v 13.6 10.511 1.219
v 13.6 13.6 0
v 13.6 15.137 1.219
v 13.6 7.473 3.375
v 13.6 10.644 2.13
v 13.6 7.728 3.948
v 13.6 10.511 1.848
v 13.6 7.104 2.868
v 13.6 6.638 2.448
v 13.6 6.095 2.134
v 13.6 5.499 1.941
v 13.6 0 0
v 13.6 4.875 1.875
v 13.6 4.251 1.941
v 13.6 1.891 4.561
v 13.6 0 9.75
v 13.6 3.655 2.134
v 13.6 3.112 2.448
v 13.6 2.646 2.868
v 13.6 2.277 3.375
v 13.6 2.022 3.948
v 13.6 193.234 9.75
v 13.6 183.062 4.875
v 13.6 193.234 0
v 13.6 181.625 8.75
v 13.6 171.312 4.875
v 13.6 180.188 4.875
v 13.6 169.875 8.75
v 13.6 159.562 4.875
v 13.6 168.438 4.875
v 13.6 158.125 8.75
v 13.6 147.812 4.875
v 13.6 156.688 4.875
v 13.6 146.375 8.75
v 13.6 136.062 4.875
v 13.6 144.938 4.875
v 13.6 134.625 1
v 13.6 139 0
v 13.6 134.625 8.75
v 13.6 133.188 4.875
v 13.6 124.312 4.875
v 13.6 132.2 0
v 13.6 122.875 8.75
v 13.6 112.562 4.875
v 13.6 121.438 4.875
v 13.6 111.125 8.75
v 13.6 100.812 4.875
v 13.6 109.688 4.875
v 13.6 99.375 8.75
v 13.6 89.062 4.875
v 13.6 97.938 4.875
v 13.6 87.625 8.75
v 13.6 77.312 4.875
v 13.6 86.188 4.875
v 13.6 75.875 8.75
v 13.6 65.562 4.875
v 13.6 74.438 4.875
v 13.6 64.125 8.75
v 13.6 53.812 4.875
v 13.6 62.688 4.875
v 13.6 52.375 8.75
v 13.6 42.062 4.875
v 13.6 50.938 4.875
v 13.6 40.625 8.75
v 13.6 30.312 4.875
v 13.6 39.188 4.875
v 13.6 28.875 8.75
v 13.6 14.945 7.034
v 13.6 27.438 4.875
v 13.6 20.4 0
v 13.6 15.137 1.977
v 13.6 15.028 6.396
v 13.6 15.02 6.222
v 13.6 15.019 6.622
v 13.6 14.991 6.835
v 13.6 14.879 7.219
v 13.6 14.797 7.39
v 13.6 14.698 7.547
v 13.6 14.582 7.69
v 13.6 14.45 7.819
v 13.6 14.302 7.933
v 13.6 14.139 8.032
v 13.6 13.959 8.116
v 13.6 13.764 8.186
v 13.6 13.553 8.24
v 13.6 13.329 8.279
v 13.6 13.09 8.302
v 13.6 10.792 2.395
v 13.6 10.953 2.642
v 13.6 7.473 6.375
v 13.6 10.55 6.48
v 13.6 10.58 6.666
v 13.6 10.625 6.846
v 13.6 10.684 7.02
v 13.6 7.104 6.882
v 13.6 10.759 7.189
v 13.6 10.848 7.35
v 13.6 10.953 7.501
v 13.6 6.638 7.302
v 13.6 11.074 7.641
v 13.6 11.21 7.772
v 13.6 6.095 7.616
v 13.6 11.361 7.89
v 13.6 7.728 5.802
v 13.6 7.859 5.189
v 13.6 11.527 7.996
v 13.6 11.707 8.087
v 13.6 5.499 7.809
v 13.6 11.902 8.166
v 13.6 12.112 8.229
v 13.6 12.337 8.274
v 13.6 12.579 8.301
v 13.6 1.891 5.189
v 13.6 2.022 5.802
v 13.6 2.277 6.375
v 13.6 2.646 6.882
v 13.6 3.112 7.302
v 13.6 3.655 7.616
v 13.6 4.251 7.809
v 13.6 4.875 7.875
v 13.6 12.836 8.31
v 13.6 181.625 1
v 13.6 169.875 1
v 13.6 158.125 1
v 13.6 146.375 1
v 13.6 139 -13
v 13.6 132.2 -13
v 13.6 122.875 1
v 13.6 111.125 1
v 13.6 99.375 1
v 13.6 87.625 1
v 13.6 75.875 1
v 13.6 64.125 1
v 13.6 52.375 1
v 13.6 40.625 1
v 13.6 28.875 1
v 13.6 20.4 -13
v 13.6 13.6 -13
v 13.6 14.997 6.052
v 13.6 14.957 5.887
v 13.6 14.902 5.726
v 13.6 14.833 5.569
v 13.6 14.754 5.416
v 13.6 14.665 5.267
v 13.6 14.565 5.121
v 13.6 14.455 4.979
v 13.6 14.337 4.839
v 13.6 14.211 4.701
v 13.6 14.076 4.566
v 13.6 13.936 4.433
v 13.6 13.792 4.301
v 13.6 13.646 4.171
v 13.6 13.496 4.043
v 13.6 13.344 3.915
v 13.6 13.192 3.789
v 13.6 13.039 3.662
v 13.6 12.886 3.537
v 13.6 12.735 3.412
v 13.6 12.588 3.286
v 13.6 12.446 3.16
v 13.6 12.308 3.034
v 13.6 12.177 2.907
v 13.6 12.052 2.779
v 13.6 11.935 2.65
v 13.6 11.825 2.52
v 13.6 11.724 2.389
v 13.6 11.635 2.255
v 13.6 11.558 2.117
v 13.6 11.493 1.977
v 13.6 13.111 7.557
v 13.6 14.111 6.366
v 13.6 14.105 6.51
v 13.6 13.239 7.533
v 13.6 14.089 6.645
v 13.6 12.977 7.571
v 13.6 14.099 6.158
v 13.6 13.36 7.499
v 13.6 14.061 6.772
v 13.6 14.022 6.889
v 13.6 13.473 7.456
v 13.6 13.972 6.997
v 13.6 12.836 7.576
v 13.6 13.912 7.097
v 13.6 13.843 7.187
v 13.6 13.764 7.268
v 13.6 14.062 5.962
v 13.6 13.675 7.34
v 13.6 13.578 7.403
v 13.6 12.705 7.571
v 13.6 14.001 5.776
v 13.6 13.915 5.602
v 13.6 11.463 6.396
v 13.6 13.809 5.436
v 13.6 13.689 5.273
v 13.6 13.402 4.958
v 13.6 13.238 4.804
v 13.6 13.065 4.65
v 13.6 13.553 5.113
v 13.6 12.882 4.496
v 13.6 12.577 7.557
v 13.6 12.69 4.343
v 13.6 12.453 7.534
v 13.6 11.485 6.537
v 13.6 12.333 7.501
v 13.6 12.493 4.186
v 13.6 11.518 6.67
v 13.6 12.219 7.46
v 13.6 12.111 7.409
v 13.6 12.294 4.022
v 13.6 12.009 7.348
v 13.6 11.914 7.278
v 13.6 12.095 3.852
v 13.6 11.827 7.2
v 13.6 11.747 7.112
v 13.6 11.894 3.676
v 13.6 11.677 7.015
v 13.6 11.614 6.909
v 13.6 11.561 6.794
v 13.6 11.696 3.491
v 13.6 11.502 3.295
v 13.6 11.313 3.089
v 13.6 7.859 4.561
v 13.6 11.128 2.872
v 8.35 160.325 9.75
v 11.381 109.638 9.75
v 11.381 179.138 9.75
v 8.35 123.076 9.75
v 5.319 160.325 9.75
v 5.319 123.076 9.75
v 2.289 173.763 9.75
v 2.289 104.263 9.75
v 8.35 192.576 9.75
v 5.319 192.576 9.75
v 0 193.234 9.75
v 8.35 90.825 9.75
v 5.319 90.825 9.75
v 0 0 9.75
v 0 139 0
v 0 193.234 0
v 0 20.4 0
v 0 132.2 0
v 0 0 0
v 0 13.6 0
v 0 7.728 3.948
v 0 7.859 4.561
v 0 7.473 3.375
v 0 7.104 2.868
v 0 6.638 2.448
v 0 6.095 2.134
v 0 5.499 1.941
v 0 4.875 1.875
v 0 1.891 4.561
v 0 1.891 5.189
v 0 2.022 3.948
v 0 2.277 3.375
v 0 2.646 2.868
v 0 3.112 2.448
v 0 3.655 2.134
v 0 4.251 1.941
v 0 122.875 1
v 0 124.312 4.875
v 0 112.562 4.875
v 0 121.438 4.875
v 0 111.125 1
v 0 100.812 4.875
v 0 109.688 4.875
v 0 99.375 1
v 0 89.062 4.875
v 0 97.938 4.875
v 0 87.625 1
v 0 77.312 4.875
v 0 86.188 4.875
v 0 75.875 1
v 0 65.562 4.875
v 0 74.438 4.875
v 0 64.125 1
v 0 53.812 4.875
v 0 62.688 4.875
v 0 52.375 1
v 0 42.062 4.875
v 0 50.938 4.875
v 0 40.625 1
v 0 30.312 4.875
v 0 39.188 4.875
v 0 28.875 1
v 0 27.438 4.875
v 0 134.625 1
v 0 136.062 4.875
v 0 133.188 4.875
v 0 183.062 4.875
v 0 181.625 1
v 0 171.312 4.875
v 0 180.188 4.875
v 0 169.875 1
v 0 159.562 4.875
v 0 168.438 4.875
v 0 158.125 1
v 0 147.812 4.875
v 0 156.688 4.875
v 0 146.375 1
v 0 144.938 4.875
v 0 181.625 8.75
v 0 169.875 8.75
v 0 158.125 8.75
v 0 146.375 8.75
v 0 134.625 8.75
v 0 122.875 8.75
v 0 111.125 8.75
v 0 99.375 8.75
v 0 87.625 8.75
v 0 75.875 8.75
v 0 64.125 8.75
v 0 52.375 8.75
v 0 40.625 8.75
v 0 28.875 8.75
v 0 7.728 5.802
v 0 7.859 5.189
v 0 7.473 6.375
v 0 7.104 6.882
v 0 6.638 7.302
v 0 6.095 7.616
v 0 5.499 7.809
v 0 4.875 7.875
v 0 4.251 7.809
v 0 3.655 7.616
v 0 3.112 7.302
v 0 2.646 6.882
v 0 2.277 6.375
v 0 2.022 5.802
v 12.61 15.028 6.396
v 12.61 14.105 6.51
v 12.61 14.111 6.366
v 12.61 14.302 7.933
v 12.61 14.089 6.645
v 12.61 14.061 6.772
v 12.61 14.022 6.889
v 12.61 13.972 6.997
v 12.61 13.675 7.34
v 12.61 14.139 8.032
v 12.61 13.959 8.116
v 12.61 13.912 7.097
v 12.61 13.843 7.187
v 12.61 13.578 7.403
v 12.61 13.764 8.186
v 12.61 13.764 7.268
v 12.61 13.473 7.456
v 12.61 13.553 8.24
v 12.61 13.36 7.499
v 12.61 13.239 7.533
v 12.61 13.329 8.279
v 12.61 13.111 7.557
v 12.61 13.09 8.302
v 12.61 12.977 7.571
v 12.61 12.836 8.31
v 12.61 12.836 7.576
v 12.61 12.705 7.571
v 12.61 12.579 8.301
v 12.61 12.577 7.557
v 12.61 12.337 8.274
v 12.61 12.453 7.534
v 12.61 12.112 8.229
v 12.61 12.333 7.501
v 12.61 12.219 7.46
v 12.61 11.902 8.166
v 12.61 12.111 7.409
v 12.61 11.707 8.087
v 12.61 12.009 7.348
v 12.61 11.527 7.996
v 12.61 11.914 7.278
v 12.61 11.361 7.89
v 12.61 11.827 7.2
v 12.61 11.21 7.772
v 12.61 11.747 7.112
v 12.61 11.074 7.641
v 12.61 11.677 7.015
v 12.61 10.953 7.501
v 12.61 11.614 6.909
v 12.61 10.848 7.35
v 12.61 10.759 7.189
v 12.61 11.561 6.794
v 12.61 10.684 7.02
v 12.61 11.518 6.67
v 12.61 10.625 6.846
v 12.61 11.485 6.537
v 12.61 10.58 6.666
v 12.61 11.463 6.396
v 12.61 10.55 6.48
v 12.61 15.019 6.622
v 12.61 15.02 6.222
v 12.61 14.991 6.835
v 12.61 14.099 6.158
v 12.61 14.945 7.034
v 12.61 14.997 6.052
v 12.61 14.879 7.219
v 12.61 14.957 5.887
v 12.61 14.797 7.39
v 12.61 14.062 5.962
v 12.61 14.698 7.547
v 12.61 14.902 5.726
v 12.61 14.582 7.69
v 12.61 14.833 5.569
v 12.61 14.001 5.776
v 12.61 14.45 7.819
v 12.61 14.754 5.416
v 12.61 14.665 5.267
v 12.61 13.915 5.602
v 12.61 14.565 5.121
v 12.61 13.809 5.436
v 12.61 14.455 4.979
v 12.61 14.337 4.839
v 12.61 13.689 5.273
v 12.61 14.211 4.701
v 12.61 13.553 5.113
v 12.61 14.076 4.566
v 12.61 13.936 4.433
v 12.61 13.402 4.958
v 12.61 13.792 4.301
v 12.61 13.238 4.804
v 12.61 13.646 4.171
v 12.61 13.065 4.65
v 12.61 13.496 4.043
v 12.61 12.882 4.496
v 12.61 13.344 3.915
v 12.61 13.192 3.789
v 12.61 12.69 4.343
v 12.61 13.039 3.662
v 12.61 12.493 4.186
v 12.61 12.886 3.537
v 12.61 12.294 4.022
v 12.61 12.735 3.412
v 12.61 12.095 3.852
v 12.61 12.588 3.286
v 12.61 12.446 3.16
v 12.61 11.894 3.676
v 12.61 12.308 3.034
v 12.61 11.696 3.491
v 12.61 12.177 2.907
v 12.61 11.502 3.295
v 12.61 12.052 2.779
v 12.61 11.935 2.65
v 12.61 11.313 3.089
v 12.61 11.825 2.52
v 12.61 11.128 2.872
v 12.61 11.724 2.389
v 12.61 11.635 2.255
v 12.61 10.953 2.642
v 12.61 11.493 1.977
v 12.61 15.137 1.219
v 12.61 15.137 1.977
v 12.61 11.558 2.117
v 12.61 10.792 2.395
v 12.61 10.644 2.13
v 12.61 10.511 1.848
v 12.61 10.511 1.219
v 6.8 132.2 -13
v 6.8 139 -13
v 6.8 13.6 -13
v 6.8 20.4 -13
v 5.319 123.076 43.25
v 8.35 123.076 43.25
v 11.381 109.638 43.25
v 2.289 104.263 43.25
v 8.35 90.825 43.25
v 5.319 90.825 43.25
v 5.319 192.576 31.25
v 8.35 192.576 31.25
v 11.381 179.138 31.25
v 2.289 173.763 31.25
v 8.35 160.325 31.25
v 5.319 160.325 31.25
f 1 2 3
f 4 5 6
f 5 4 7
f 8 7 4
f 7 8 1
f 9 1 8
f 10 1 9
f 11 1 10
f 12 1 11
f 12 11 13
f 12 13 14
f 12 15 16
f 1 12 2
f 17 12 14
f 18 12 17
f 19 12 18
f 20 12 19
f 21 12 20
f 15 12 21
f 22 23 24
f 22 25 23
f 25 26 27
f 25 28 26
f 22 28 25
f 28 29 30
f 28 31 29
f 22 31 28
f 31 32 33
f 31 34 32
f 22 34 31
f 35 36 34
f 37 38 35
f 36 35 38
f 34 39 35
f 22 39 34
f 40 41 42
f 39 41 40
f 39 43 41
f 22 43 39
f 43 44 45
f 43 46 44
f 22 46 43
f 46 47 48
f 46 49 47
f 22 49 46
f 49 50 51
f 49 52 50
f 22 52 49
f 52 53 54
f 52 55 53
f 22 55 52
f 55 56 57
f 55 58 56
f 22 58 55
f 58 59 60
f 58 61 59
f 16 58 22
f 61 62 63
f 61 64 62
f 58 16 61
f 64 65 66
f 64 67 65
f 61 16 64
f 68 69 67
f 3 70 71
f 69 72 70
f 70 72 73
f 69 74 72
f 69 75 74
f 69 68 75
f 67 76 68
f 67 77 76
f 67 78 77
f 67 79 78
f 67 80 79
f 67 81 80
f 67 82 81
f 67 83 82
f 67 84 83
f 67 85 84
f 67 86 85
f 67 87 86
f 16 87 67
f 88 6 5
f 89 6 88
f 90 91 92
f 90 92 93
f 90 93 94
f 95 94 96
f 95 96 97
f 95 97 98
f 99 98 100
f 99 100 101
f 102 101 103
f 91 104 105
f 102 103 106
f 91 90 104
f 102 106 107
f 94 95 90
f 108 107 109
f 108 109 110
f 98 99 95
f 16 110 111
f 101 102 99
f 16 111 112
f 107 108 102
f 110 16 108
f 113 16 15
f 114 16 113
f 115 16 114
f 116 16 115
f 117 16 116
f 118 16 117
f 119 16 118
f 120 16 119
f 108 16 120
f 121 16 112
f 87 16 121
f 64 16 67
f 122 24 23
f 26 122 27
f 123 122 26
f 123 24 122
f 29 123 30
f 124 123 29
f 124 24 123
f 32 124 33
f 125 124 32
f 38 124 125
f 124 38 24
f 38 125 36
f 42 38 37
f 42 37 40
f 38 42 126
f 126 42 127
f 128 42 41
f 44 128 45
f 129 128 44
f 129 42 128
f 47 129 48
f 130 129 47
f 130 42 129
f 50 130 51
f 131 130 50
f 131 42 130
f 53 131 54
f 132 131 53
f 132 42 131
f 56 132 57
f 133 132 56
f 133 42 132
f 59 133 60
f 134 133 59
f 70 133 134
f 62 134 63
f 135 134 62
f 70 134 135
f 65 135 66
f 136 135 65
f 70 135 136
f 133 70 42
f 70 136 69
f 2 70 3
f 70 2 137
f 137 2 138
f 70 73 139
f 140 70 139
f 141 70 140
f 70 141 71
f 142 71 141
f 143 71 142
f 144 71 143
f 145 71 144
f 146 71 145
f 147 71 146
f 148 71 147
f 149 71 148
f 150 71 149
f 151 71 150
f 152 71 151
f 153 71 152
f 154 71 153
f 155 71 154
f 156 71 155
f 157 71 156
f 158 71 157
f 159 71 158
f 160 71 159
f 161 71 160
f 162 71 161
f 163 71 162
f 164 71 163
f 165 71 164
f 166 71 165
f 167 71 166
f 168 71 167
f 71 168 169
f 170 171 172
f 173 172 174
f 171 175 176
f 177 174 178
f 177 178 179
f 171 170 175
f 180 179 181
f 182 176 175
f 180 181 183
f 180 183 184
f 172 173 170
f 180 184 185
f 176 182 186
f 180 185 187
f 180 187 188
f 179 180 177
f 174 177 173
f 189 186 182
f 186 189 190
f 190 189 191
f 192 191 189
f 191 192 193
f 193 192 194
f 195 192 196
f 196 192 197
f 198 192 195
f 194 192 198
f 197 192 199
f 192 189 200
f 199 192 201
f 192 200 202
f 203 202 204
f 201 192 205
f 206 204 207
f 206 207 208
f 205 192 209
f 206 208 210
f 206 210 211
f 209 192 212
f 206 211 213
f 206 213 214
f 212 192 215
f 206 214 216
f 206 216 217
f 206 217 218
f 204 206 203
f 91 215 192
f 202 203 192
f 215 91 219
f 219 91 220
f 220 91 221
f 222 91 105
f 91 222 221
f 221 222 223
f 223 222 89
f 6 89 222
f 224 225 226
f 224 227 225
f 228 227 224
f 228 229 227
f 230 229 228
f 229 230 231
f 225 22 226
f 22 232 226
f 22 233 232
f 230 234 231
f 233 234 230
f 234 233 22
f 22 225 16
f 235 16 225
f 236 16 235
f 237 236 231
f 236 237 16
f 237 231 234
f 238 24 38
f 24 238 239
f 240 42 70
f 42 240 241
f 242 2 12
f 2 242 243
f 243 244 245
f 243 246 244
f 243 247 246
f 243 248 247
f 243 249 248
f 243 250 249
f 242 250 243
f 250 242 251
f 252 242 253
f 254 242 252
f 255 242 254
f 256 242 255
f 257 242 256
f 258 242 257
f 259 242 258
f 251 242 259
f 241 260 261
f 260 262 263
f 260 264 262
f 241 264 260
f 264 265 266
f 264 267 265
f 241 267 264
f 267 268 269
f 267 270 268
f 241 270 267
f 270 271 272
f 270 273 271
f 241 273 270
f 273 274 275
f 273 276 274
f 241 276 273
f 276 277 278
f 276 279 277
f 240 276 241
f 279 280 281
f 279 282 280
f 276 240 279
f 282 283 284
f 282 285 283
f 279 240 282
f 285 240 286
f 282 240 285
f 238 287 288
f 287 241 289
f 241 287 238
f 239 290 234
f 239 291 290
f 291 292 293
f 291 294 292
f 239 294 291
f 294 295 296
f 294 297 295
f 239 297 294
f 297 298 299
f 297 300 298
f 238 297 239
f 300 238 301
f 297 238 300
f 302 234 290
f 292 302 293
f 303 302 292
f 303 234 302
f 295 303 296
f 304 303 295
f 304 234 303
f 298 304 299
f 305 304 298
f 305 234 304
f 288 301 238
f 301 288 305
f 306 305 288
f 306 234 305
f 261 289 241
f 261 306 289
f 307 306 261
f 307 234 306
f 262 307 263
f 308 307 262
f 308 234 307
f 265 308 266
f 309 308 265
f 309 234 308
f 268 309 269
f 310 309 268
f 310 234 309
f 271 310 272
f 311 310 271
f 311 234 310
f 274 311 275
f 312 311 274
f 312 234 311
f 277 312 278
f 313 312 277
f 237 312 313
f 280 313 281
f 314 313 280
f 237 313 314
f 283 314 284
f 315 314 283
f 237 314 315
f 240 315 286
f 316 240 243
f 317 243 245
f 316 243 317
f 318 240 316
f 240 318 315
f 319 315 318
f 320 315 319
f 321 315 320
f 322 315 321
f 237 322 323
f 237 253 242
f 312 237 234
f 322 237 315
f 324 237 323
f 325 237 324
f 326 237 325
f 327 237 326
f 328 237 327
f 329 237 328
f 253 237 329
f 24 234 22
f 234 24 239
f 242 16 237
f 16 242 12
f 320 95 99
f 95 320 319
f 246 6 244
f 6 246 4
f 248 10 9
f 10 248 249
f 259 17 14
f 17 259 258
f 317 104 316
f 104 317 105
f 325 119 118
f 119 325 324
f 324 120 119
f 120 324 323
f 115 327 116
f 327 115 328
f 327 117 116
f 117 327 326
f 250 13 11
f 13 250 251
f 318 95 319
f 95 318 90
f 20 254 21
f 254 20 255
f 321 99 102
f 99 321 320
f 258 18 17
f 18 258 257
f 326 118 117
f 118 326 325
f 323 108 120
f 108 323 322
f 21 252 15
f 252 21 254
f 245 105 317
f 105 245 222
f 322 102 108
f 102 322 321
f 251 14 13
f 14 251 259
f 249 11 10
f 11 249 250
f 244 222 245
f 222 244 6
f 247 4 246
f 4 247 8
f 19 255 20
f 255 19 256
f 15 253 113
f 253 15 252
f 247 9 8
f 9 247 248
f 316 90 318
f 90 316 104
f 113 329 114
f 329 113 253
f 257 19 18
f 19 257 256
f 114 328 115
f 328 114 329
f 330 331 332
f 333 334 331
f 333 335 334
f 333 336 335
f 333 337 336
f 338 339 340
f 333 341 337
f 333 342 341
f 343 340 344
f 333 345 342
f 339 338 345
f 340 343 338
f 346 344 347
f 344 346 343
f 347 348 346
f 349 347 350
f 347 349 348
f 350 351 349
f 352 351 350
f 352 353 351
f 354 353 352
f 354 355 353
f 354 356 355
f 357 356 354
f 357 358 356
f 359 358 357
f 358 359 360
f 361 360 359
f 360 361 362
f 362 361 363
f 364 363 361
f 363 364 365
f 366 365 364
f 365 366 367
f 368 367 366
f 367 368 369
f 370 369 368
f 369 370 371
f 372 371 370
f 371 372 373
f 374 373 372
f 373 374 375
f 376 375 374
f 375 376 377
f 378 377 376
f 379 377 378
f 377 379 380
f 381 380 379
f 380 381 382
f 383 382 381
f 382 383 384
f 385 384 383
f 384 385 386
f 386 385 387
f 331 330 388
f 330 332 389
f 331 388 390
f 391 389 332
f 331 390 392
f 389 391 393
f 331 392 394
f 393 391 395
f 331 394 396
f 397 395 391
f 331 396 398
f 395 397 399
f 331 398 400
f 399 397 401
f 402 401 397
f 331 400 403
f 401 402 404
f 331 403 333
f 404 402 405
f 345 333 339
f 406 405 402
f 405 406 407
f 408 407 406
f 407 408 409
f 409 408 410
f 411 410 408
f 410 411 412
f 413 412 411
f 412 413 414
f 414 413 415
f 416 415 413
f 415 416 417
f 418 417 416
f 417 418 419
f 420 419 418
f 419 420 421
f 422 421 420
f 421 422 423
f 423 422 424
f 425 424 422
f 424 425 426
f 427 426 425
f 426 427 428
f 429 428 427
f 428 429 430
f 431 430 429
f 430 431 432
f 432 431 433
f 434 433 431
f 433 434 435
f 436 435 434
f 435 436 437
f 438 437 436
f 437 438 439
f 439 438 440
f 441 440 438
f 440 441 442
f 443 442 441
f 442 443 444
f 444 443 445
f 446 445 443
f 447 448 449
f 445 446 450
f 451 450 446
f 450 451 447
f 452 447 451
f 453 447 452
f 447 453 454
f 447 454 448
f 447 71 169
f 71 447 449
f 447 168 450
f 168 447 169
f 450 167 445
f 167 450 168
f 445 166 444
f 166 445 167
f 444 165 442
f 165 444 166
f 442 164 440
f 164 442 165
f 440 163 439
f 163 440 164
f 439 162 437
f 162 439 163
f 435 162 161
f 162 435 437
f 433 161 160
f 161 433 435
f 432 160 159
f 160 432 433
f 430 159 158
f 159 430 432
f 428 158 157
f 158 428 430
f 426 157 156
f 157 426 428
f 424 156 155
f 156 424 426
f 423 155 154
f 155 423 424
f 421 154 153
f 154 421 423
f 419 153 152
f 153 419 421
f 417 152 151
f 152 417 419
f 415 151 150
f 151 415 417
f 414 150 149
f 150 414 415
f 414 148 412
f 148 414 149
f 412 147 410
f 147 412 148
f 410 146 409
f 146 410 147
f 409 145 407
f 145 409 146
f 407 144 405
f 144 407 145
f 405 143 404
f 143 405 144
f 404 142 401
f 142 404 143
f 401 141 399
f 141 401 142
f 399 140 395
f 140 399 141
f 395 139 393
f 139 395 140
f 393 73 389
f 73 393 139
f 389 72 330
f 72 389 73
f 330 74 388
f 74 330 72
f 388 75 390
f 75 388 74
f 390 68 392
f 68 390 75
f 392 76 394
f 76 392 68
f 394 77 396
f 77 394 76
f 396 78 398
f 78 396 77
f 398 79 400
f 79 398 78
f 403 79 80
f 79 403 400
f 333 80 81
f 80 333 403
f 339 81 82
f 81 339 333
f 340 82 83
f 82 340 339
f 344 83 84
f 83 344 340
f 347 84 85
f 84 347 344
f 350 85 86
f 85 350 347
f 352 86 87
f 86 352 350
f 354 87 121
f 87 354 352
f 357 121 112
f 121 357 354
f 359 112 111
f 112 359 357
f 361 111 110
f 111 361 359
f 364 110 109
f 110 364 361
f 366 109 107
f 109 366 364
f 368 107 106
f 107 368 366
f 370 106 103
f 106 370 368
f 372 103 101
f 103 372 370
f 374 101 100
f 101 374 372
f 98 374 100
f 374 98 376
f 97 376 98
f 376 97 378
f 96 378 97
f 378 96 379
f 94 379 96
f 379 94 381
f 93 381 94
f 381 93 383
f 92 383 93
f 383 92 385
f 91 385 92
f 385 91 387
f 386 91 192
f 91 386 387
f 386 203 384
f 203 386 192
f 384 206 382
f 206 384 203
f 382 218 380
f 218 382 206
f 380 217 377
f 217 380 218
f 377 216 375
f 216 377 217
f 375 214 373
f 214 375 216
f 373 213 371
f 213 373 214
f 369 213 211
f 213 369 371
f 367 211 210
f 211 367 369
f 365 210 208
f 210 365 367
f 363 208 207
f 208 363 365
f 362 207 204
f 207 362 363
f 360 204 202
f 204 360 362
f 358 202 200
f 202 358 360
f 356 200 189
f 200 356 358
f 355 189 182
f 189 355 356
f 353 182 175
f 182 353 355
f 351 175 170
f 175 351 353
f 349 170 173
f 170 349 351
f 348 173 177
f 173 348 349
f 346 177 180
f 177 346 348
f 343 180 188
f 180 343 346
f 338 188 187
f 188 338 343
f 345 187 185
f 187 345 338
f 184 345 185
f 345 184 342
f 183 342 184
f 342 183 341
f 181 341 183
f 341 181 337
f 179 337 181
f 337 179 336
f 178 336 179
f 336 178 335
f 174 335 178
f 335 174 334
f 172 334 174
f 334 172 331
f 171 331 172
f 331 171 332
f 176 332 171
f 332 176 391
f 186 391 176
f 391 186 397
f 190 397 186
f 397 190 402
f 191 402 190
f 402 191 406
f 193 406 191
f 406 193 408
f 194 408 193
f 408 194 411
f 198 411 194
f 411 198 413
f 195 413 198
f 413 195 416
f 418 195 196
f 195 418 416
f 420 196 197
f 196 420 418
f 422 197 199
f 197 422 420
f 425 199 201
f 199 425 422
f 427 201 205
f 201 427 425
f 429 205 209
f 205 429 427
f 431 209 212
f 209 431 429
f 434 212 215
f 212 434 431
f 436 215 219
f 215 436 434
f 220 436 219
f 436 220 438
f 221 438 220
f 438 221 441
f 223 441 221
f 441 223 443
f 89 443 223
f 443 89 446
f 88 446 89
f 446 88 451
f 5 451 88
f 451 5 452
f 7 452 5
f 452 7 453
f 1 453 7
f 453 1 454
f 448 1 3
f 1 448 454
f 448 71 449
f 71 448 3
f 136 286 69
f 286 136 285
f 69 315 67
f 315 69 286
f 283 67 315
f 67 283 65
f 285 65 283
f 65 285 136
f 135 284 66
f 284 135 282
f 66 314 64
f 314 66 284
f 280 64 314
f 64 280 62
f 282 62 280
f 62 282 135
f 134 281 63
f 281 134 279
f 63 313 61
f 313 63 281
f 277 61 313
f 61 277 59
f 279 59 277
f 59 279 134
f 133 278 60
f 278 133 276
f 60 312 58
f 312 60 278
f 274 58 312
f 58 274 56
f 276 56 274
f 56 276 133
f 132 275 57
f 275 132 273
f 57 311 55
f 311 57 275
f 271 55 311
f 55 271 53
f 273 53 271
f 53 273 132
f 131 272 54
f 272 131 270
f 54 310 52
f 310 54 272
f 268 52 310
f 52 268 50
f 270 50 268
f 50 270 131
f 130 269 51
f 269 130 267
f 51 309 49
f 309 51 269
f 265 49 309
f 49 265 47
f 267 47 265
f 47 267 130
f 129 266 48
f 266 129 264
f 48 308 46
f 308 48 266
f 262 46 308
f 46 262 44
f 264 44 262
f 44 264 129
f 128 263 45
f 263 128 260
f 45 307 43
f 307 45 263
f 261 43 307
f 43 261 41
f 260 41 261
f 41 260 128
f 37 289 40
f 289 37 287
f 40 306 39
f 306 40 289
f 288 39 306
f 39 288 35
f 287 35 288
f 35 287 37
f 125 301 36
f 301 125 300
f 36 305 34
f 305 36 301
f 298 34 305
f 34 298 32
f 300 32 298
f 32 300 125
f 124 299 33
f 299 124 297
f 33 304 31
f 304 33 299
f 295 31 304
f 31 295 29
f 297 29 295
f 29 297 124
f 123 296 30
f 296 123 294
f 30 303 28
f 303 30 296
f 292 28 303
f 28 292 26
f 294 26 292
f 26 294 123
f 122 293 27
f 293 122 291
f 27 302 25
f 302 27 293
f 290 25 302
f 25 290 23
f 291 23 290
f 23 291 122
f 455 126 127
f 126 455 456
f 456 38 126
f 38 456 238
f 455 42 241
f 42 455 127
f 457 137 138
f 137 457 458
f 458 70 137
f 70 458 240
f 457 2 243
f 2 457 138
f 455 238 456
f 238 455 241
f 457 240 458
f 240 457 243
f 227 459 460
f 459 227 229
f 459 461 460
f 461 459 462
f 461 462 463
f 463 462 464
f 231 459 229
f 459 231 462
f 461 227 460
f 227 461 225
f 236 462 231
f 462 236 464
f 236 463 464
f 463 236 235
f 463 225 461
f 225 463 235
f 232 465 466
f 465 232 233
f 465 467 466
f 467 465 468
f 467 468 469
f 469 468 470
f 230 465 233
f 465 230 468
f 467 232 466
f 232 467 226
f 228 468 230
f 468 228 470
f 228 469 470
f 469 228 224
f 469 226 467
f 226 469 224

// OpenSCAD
// file: values.scad
$fs=0.1;
//Constants:
edgeRadius=1.5;
underKeyWidth=13.6;
baseHeight=9.75;
genh=5.791666666666667;
a=27.423996629776394;
b=12.370392724366756;
c=12.370392724366756;
d=38.393595281686956;
overhead=65.81759191146335;
keyTravelDistance=13.0;
desiredGamut=24;
shift=3.092598181091689;
holeScale=0.5;
stalkScale=0.48;

Points = [
[shift,a,0],//0
[(b-shift),0,0],//1
[(b+shift),0,0],//2
[(b+c-shift),d,0],//3
[(c+shift),(a+d),0],//4
[(c-shift),(a+d),0],//5
[shift,a,keyTravelDistance],//6
[(b-shift),0,keyTravelDistance],//7
[(b+shift),0,keyTravelDistance],//8
[(b+c-shift),d,keyTravelDistance],//9
[(c+shift),(a+d),keyTravelDistance],//10
[(c-shift),(a+d),keyTravelDistance],//11
];
Faces = [
[0,1,2,3,4,5],
[1,0,6,7],
[2,1,7,8],
[3,2,8,9],
[4,3,9,10],
[5,4,10,11],
[0,5,11,6],
[11,10,9,8,7,6] 
];
// file: keytop.scad
include<values.scad>;
keytop();

module keytopShape(){
polyhedron(Points,Faces);
}
module keytop(){
difference(){
keytopShape();
translate([(b+c)/4,(d+a)/4,-0.1])
scale(holeScale,holeScale,holeScale)
keytopShape();
edge(6,11,1,-1);
edge(6,7,1,1);
edge(7,8,1,1);
edge(8,9,1,1);
edge(9,10,1,-1,-1);
edge(10,11,1,-1);
}
module edge (point1,point2,d1,d2,d3=1){
difference(){
translate([Points[point1][0],Points[point1][1],Points[point1][2]])
rotate([0,90,atan((Points[point2][1]-Points[point1][1])/(Points[point2][0]-Points[point1][0]))])
translate([0,0,d3*30])
rotate(45,0,0)
cube([pow(2*(edgeRadius*edgeRadius),1/2),pow(2*(edgeRadius*edgeRadius),1/2),90],true);
translate([Points[point1][0],Points[point1][1],Points[point1][2]])
rotate([0,90,atan((Points[point2][1]-Points[point1][1])/(Points[point2][0]-Points[point1][0]))])
translate([d1*edgeRadius,d2*edgeRadius,d3*30])
cylinder(90,edgeRadius,edgeRadius, true);
}
}

}
// main file
use<keytop.scad>
include<values.scad>
rotate([0,90,0])2_10();
module 2_10(keytops=false){
length=193.23425857813004;
rotate([0,-90,0]){
//Main Base:
difference(){
cube([underKeyWidth,length,baseHeight],false);
translate([-.1,0.5*baseHeight,0.5*baseHeight])rotate([0,90,0])
cylinder((underKeyWidth+.2),r=3, false);
translate([underKeyWidth-.99,10,0.125*baseHeight])
rotate([90,0,90])
linear_extrude(height=1){
text("2",size=baseHeight*0.75);
}

//Warp Cuts:
translate([-1,0.0+25+0.25*baseHeight,baseHeight-1])
rotate([0,90,0])
linear_extrude(height=underKeyWidth+2)
polygon(points=[[0.5*baseHeight-1,0],[baseHeight-2,0.25*baseHeight-1],[0.5*baseHeight-1,0.5*baseHeight-2],[0,0.25*baseHeight-1]]);
translate([-1,11.75+25+0.25*baseHeight,baseHeight-1])
rotate([0,90,0])
linear_extrude(height=underKeyWidth+2)
polygon(points=[[0.5*baseHeight-1,0],[baseHeight-2,0.25*baseHeight-1],[0.5*baseHeight-1,0.5*baseHeight-2],[0,0.25*baseHeight-1]]);
translate([-1,23.5+25+0.25*baseHeight,baseHeight-1])
rotate([0,90,0])
linear_extrude(height=underKeyWidth+2)
polygon(points=[[0.5*baseHeight-1,0],[baseHeight-2,0.25*baseHeight-1],[0.5*baseHeight-1,0.5*baseHeight-2],[0,0.25*baseHeight-1]]);
translate([-1,35.25+25+0.25*baseHeight,baseHeight-1])
rotate([0,90,0])
linear_extrude(height=underKeyWidth+2)
polygon(points=[[0.5*baseHeight-1,0],[baseHeight-2,0.25*baseHeight-1],[0.5*baseHeight-1,0.5*baseHeight-2],[0,0.25*baseHeight-1]]);
translate([-1,47.0+25+0.25*baseHeight,baseHeight-1])
rotate([0,90,0])
linear_extrude(height=underKeyWidth+2)
polygon(points=[[0.5*baseHeight-1,0],[baseHeight-2,0.25*baseHeight-1],[0.5*baseHeight-1,0.5*baseHeight-2],[0,0.25*baseHeight-1]]);
translate([-1,58.75+25+0.25*baseHeight,baseHeight-1])
rotate([0,90,0])
linear_extrude(height=underKeyWidth+2)
polygon(points=[[0.5*baseHeight-1,0],[baseHeight-2,0.25*baseHeight-1],[0.5*baseHeight-1,0.5*baseHeight-2],[0,0.25*baseHeight-1]]);
translate([-1,70.5+25+0.25*baseHeight,baseHeight-1])
rotate([0,90,0])
linear_extrude(height=underKeyWidth+2)
polygon(points=[[0.5*baseHeight-1,0],[baseHeight-2,0.25*baseHeight-1],[0.5*baseHeight-1,0.5*baseHeight-2],[0,0.25*baseHeight-1]]);
translate([-1,82.25+25+0.25*baseHeight,baseHeight-1])
rotate([0,90,0])
linear_extrude(height=underKeyWidth+2)
polygon(points=[[0.5*baseHeight-1,0],[baseHeight-2,0.25*baseHeight-1],[0.5*baseHeight-1,0.5*baseHeight-2],[0,0.25*baseHeight-1]]);
translate([-1,94.0+25+0.25*baseHeight,baseHeight-1])
rotate([0,90,0])
linear_extrude(height=underKeyWidth+2)
polygon(points=[[0.5*baseHeight-1,0],[baseHeight-2,0.25*baseHeight-1],[0.5*baseHeight-1,0.5*baseHeight-2],[0,0.25*baseHeight-1]]);
translate([-1,105.75+25+0.25*baseHeight,baseHeight-1])
rotate([0,90,0])
linear_extrude(height=underKeyWidth+2)
polygon(points=[[0.5*baseHeight-1,0],[baseHeight-2,0.25*baseHeight-1],[0.5*baseHeight-1,0.5*baseHeight-2],[0,0.25*baseHeight-1]]);
translate([-1,117.5+25+0.25*baseHeight,baseHeight-1])
rotate([0,90,0])
linear_extrude(height=underKeyWidth+2)
polygon(points=[[0.5*baseHeight-1,0],[baseHeight-2,0.25*baseHeight-1],[0.5*baseHeight-1,0.5*baseHeight-2],[0,0.25*baseHeight-1]]);
translate([-1,129.25+25+0.25*baseHeight,baseHeight-1])
rotate([0,90,0])
linear_extrude(height=underKeyWidth+2)
polygon(points=[[0.5*baseHeight-1,0],[baseHeight-2,0.25*baseHeight-1],[0.5*baseHeight-1,0.5*baseHeight-2],[0,0.25*baseHeight-1]]);
translate([-1,141.0+25+0.25*baseHeight,baseHeight-1])
rotate([0,90,0])
linear_extrude(height=underKeyWidth+2)
polygon(points=[[0.5*baseHeight-1,0],[baseHeight-2,0.25*baseHeight-1],[0.5*baseHeight-1,0.5*baseHeight-2],[0,0.25*baseHeight-1]]);
translate([-1,152.75+25+0.25*baseHeight,baseHeight-1])
rotate([0,90,0])
linear_extrude(height=underKeyWidth+2)
polygon(points=[[0.5*baseHeight-1,0],[baseHeight-2,0.25*baseHeight-1],[0.5*baseHeight-1,0.5*baseHeight-2],[0,0.25*baseHeight-1]]);
}
//Key Stalks:
translate([shift/4,(genh*10-(d+a)/2+overhead),baseHeight]){
linear_extrude(height=(keyTravelDistance*1.5+desiredGamut-10)){
scale((stalkScale+holeScale)/2,stalkScale)
polygon(points=[
[Points[0][0],Points[0][1]],[Points[1][0],Points[1][1]],[Points[2][0],Points[2][1]],[Points[3][0],Points[3][1]],[Points[4][0],Points[4][1]],[Points[5][0],Points[5][1]],[Points[6][0],Points[6][1]]
]);
}
if(keytops)
translate([0,(-0.5*(a+d)),(keyTravelDistance*1.5+desiredGamut-10+40)])
keytop();
}
translate([shift/4,(genh*22-(d+a)/2+overhead),baseHeight]){
linear_extrude(height=(keyTravelDistance*1.5+desiredGamut-22)){
scale((stalkScale+holeScale)/2,stalkScale)
polygon(points=[
[Points[0][0],Points[0][1]],[Points[1][0],Points[1][1]],[Points[2][0],Points[2][1]],[Points[3][0],Points[3][1]],[Points[4][0],Points[4][1]],[Points[5][0],Points[5][1]],[Points[6][0],Points[6][1]]
]);
}
if(keytops)
translate([0,(-0.5*(a+d)),(keyTravelDistance*1.5+desiredGamut-22+40)])
keytop();
}
//Feet:
difference(){union(){translate([0,132.2,-13.0]){
cube([13.6,6.8,13.0],false);}
translate([0,13.6,-13.0]){
cube([13.6,6.8,13.0],false);}}
rotate([0,-27.613027823084472,0])
translate([-26.0,0.5,-26.0])
cube([26.0,197.91666666666669,26.0]);
}
}}
